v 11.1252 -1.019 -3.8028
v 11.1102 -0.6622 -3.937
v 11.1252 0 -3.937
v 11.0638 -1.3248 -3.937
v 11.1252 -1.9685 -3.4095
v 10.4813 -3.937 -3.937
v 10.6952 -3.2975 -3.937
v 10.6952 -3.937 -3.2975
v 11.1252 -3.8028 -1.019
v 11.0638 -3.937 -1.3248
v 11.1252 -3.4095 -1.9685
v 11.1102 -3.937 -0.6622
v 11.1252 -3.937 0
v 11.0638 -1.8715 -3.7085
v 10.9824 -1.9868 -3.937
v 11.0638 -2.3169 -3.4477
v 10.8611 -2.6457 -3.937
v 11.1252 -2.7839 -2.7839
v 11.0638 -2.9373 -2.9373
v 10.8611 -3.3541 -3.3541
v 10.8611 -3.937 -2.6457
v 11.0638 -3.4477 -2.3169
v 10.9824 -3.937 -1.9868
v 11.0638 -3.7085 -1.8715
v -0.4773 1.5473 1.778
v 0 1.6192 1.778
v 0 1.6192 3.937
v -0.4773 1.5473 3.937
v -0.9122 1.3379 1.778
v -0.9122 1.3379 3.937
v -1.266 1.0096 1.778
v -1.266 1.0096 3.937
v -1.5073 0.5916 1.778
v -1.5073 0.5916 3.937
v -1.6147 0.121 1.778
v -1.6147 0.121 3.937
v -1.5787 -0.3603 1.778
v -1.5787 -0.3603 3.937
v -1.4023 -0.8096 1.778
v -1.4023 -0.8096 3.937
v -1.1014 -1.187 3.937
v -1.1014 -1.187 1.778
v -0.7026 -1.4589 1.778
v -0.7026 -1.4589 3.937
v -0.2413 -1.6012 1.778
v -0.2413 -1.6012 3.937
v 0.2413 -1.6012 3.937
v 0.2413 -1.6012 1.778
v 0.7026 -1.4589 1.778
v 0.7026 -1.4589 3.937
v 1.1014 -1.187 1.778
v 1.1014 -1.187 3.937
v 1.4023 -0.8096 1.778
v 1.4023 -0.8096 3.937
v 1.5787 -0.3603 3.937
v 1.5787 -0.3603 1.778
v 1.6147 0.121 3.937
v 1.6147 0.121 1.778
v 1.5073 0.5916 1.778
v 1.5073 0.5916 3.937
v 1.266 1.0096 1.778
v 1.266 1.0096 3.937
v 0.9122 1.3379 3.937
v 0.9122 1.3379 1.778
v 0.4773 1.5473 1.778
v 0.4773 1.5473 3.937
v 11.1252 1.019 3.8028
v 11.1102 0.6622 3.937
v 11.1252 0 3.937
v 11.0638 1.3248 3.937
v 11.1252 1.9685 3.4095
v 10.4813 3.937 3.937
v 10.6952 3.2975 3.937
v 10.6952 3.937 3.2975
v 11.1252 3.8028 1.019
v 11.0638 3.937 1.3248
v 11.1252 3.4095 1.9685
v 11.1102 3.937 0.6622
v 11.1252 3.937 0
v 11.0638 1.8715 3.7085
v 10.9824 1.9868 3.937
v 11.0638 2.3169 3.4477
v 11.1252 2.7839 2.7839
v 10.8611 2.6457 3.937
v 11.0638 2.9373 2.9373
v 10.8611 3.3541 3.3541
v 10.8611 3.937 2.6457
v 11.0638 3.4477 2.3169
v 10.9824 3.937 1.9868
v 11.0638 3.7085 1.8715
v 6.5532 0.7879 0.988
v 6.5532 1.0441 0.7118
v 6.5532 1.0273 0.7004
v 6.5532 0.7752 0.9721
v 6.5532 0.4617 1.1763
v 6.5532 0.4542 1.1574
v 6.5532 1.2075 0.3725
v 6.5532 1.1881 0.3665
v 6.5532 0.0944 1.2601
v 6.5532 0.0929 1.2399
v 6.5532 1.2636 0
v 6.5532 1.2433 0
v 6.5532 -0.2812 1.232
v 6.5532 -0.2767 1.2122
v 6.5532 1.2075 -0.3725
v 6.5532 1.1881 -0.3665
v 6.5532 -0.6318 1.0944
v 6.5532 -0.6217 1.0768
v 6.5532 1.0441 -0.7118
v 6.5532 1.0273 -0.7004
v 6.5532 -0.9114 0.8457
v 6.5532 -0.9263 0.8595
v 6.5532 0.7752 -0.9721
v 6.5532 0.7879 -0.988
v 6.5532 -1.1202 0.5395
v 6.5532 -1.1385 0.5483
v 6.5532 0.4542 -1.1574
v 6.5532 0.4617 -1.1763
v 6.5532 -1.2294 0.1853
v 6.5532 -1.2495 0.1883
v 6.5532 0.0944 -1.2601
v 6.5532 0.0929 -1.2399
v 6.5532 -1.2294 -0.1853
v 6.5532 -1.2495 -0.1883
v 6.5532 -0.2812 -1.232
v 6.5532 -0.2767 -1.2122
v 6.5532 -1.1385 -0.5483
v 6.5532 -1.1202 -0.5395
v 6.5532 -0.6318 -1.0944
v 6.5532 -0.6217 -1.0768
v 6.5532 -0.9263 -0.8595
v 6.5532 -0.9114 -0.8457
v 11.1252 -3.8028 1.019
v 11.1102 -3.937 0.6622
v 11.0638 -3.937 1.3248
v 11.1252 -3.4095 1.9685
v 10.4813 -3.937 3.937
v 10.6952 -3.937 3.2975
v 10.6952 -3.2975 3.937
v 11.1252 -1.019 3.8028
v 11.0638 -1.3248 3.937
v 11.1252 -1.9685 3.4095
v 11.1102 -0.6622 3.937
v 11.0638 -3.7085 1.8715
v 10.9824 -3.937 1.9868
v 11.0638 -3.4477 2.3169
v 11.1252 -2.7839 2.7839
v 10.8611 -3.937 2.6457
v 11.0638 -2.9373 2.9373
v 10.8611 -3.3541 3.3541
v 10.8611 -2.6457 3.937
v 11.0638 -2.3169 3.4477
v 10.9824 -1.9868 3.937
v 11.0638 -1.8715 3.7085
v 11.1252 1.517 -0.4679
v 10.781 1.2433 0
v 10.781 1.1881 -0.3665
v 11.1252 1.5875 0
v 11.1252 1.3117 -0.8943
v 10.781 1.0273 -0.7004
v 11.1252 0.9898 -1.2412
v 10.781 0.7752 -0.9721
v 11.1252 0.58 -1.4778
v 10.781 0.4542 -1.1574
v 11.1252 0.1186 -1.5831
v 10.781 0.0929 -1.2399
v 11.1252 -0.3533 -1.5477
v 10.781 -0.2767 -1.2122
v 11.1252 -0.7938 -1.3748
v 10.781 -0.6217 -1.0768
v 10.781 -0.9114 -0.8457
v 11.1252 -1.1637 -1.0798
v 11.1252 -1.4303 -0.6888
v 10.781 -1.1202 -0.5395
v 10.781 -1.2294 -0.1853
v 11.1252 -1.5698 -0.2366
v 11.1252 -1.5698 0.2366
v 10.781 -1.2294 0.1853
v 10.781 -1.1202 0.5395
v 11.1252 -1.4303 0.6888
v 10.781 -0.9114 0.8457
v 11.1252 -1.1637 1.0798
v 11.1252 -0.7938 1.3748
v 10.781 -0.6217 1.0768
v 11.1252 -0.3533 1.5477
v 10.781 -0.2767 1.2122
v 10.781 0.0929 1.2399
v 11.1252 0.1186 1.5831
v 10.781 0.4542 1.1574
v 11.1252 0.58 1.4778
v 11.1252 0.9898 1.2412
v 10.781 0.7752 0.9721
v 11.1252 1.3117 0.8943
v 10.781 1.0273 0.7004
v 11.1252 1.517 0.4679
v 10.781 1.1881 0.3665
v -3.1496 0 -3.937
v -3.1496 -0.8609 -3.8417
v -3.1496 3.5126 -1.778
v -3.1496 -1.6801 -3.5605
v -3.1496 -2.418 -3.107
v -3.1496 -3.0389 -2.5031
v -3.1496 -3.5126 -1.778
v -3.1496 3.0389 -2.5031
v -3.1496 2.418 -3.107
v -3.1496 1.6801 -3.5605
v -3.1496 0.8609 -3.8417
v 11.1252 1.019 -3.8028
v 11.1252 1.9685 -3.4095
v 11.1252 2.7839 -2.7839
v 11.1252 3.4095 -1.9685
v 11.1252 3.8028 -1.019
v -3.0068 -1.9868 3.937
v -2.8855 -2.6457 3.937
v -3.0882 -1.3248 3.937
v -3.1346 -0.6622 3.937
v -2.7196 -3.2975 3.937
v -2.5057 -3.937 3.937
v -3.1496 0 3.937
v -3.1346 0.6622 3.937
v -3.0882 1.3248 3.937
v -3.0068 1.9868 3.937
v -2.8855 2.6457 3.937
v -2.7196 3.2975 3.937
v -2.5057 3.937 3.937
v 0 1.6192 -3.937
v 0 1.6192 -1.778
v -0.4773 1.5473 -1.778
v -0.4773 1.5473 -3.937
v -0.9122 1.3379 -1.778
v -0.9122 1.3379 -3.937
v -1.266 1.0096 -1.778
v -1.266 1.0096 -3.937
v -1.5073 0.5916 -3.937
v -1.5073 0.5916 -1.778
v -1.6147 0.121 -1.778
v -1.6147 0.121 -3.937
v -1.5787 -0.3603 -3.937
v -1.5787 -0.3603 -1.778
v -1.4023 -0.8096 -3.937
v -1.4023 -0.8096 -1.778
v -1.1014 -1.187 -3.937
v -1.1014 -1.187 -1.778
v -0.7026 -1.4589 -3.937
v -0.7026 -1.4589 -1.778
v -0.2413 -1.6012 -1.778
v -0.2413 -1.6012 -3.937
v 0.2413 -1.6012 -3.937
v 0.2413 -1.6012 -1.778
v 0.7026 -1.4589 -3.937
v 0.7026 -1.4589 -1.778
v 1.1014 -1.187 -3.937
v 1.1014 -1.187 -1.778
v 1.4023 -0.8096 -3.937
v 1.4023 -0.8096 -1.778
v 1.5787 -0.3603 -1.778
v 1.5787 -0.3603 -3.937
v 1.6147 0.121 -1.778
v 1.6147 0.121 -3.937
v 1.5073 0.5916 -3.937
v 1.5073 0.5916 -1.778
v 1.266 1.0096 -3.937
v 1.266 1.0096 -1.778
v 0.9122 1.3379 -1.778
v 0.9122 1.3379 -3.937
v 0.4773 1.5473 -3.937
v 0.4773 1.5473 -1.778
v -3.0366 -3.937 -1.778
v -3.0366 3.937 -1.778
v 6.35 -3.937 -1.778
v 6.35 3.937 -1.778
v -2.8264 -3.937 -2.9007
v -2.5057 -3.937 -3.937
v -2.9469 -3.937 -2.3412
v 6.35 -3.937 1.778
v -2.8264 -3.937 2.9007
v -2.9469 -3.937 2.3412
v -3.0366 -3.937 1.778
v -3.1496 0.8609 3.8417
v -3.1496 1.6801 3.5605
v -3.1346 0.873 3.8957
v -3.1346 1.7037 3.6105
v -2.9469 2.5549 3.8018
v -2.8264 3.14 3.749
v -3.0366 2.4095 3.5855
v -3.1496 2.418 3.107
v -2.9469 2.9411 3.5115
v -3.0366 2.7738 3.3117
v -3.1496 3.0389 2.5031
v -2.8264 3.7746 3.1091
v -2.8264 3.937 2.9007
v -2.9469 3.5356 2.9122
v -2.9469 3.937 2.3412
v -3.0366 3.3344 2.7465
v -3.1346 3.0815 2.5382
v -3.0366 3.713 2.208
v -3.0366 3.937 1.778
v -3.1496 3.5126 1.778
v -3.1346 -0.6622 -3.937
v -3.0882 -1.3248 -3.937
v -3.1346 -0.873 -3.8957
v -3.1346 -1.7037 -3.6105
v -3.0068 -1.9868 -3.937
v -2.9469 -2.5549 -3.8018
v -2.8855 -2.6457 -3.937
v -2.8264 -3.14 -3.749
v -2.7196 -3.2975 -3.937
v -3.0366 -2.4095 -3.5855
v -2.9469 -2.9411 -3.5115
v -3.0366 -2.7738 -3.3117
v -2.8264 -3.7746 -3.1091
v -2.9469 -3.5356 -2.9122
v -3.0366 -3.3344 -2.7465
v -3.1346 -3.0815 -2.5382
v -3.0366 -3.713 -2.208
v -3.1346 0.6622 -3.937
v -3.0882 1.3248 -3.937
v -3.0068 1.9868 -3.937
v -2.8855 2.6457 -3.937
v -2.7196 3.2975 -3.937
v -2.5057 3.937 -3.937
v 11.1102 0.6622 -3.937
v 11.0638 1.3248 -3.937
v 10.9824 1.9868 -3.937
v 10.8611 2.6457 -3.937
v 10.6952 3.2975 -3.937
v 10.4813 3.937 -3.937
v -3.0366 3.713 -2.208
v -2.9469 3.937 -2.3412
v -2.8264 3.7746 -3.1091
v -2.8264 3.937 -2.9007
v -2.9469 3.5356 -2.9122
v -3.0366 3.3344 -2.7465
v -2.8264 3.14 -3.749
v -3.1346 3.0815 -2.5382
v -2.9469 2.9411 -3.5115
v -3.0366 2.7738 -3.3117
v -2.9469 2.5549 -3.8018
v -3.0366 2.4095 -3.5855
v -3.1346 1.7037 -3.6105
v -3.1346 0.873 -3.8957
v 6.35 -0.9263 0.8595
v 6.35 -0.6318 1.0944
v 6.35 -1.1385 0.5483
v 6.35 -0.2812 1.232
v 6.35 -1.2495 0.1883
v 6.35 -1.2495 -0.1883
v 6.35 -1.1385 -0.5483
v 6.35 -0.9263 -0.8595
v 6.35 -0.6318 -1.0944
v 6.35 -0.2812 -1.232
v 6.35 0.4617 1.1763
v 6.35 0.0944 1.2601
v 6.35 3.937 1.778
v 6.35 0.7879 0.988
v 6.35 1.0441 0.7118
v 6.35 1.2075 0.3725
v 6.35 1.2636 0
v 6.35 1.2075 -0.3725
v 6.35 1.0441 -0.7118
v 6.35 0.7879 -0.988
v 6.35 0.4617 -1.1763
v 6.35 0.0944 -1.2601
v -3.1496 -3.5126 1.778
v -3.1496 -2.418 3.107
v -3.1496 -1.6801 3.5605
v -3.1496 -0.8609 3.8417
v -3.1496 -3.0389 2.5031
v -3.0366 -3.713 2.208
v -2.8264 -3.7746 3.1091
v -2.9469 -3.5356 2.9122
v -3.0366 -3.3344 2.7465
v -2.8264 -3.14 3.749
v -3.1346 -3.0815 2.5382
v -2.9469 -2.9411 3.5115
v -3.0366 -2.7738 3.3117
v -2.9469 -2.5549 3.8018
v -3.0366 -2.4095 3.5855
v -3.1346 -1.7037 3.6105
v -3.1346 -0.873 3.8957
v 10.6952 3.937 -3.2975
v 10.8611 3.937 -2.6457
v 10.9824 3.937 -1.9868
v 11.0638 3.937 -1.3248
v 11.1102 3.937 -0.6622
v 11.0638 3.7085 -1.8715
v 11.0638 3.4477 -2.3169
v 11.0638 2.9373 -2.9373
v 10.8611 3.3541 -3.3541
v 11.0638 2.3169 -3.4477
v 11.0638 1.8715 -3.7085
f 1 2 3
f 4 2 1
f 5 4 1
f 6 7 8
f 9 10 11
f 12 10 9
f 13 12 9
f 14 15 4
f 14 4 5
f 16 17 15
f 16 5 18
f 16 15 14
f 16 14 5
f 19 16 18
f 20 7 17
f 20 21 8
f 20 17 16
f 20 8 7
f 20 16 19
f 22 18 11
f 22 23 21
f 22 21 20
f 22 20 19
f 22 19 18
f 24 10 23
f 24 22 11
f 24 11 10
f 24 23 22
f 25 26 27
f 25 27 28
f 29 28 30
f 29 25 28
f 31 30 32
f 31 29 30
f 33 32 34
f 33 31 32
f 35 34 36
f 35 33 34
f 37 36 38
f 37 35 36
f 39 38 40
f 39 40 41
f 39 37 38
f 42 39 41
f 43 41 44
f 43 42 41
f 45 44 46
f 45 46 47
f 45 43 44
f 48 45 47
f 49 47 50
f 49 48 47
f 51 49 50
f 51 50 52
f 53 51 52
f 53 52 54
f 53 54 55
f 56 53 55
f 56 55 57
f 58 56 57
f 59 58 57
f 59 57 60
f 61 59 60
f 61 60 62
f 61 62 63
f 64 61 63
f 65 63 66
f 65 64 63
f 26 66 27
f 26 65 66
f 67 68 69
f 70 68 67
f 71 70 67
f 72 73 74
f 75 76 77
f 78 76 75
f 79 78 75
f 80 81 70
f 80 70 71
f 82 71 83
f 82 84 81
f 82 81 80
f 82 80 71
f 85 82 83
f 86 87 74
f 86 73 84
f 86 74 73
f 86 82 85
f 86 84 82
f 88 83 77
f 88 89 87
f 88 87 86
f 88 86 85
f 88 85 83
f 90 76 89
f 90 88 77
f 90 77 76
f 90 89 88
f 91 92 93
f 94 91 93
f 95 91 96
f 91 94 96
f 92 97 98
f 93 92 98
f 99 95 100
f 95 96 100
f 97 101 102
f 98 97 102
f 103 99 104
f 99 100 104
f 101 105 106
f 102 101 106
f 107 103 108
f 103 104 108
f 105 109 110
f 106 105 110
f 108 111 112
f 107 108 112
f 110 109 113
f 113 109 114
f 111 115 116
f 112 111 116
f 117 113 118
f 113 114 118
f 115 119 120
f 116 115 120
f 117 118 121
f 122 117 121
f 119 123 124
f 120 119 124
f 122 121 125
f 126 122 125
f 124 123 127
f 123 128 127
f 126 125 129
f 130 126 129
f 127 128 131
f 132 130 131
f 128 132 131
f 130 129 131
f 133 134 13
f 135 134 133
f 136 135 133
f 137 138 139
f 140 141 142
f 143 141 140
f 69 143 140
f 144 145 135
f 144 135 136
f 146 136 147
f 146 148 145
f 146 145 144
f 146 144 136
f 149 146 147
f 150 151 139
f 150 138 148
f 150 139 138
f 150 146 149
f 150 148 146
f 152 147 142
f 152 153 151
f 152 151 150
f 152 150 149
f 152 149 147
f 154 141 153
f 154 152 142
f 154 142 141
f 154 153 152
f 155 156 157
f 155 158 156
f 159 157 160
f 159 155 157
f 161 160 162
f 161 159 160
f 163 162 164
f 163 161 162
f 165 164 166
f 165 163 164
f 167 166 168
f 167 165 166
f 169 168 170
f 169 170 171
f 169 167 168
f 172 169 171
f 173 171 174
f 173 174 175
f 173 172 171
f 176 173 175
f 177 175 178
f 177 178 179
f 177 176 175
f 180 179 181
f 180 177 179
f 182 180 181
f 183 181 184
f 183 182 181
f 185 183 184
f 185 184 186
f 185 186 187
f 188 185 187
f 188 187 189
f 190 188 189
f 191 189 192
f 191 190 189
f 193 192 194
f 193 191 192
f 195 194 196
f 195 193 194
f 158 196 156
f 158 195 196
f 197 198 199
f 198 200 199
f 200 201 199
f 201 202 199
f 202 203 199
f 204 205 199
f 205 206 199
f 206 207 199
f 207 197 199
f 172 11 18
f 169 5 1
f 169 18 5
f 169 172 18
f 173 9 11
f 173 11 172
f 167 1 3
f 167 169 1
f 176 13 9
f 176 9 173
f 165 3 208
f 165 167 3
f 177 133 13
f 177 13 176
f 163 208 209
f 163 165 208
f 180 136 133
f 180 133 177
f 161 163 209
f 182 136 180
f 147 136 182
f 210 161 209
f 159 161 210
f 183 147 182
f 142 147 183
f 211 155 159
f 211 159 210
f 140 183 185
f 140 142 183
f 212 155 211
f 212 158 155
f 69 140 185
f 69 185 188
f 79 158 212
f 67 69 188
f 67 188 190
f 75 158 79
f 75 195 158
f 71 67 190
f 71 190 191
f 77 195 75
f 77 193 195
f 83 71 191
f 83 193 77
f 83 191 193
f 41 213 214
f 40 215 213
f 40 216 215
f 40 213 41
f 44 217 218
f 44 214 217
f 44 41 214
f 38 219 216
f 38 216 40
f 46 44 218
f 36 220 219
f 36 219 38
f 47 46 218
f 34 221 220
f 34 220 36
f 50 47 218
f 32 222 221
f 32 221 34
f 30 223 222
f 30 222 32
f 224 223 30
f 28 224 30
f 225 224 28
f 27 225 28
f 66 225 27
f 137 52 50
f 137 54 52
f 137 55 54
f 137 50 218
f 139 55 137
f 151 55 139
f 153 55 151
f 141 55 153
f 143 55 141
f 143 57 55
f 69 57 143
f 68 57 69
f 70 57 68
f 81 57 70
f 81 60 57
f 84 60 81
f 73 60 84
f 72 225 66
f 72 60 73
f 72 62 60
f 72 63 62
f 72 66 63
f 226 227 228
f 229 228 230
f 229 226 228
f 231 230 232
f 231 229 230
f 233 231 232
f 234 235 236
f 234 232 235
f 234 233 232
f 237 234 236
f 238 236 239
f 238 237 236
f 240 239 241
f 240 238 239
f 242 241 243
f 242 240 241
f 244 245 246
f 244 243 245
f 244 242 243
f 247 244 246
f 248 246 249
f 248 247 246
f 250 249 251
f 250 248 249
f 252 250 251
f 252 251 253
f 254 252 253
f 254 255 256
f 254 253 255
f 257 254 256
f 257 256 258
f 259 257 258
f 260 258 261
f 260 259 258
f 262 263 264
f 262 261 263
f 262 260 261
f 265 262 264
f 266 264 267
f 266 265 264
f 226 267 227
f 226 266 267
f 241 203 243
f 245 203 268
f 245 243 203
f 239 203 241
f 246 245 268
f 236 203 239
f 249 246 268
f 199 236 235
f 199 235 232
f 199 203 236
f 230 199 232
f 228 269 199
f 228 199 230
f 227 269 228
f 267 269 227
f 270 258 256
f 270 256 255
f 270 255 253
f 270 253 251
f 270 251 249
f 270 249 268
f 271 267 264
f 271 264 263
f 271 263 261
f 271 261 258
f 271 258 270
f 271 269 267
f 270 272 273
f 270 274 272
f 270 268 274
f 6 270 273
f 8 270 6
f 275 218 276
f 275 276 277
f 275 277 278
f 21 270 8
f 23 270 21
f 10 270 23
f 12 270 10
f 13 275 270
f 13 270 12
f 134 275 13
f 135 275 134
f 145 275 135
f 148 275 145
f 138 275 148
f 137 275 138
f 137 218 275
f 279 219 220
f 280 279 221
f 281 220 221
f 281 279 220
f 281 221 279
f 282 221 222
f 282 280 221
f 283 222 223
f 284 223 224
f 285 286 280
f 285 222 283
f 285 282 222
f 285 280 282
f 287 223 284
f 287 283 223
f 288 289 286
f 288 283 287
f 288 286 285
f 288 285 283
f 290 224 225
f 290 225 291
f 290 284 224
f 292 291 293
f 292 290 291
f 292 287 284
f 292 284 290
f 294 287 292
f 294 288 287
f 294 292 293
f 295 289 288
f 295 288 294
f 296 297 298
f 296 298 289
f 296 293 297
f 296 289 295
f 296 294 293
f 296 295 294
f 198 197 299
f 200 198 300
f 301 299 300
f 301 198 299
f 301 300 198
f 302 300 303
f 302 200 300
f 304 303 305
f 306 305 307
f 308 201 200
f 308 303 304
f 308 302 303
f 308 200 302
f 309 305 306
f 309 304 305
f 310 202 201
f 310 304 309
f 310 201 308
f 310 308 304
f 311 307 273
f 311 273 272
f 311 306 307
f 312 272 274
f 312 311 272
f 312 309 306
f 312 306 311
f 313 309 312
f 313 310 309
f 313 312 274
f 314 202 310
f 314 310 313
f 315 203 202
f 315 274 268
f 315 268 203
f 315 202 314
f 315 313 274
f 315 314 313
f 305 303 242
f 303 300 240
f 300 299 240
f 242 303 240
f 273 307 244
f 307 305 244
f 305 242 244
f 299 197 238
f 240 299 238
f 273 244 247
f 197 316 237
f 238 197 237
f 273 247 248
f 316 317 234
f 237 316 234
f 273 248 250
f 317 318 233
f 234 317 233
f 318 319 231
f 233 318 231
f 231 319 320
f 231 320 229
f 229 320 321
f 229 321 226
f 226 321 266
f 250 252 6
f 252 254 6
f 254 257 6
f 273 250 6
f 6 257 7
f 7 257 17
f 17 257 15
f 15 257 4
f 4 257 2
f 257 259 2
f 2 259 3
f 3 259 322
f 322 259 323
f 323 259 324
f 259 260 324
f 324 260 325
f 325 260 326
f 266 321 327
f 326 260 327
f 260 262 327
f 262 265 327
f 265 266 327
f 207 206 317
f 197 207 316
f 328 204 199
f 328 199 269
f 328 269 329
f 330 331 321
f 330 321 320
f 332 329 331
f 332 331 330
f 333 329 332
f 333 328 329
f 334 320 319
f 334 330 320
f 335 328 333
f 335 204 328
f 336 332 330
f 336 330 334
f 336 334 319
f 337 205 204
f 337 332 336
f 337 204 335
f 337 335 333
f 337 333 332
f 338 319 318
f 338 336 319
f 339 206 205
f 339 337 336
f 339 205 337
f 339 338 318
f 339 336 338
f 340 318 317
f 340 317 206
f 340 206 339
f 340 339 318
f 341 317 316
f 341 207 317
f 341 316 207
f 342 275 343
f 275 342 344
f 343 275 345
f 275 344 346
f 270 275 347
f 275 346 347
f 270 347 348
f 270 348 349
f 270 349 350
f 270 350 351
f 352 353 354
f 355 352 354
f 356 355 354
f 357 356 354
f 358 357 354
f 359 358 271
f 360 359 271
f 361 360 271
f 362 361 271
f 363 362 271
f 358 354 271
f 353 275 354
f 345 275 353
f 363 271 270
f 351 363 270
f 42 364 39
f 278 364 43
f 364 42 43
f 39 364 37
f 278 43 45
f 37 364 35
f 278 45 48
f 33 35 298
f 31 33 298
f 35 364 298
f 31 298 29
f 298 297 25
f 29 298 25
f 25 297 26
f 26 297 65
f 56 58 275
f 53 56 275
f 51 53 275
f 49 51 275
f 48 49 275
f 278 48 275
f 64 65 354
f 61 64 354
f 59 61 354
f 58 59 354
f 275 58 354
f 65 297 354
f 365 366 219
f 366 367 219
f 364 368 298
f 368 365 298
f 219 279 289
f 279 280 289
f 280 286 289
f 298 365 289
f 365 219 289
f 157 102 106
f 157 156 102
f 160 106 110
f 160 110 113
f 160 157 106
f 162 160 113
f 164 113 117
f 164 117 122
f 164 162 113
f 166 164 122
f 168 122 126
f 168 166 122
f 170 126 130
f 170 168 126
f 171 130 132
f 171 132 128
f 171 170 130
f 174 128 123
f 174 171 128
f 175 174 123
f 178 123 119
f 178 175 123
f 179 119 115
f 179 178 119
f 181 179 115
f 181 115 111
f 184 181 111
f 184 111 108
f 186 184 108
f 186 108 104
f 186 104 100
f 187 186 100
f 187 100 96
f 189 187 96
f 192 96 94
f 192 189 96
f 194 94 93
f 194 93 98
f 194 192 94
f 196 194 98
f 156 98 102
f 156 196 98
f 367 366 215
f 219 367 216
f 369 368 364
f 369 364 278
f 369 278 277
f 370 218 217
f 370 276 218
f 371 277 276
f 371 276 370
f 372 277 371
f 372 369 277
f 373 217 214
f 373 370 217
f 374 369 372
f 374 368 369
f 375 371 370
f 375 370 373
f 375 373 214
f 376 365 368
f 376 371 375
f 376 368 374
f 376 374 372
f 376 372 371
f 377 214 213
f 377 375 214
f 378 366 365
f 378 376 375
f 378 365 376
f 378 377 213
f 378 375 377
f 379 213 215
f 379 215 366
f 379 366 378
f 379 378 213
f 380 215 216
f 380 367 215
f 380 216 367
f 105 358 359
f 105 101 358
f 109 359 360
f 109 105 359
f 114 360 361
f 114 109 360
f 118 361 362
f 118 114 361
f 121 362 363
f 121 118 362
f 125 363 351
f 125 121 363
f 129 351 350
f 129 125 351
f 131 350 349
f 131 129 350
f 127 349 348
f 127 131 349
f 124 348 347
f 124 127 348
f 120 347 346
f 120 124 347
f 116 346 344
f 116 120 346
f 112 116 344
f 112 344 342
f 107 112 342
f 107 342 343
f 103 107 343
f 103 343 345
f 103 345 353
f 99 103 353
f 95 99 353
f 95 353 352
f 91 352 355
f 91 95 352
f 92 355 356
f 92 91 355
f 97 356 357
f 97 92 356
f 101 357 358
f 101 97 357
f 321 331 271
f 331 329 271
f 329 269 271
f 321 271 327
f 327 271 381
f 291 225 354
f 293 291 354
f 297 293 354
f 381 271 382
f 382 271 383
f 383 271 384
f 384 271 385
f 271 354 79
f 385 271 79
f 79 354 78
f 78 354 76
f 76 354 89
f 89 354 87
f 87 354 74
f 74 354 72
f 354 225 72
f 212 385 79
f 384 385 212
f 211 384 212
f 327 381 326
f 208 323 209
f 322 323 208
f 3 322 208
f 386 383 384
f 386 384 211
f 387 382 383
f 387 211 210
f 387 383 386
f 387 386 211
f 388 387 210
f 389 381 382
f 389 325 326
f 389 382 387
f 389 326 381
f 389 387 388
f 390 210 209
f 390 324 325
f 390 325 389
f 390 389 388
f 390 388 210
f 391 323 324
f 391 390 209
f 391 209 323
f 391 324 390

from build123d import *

# Parameters (mm, degrees)
BOSS_EXTRUDE1_DEPTH      = 3.937
BOSS_EXTRUDE1_DEPTH_BACK = 3.937
SKETCH1_W                = 14.2748
SKETCH1_H                = 7.874
CUT_EXTRUDE1_DEPTH       = 3.937
CUT_EXTRUDE1_DEPTH_BACK  = 3.937
SKETCH2_W                = 9.4996
SKETCH2_H                = 3.556
SKETCH4_W                = 0.2032
SKETCH4_H                = 1.26365
SKETCH5_W                = 7.874
SKETCH5_H                = 1.61925


with BuildPart() as part:
    # Sketch1 → Boss-Extrude1 (new, two sides: drawn at the far end of the back side and taken through both)
    with BuildSketch(Plane.XY.offset(-BOSS_EXTRUDE1_DEPTH_BACK)):
        with Locations((3.9878, 0)):
            Rectangle(SKETCH1_W, SKETCH1_H)
    extrude(amount=BOSS_EXTRUDE1_DEPTH + BOSS_EXTRUDE1_DEPTH_BACK)

    # Sketch2 → Cut-Extrude1 (cut, two sides: drawn at the far end of the back side and taken through both)
    with BuildSketch(Plane(origin=(0, 0, 0), x_dir=(1, 0, 0), z_dir=(0, 1, 0)).offset(-CUT_EXTRUDE1_DEPTH_BACK)):
        with Locations((1.6002, 0)):
            Rectangle(SKETCH2_W, SKETCH2_H)
    extrude(amount=CUT_EXTRUDE1_DEPTH + CUT_EXTRUDE1_DEPTH_BACK, mode=Mode.SUBTRACT)

    # Sketch3 → Cut-Revolve1 (revolve, cut)
    with BuildSketch(Plane.XY):
        Polygon((6.5532, 0), (6.5532, 1.24333), (10.78103, 1.24333), (11.1252, 1.5875), (11.1252, 0), align=None)
    revolve(axis=Axis((11.1252, 0, 0), (-1, 0, 0)), mode=Mode.SUBTRACT)

    # Sketch4 → Cut-Revolve2 (revolve, cut)
    with BuildSketch(Plane.XY):
        with Locations((6.4516, 0.631825)):
            Rectangle(SKETCH4_W, SKETCH4_H)
    revolve(axis=Axis((6.5532, 0, 0), (-1, 0, 0)), mode=Mode.SUBTRACT)

    # Sketch5 → Cut-Revolve3 (revolve, cut)
    with BuildSketch(Plane(origin=(0, 0, 0), x_dir=(0, 0, -1), z_dir=(1, 0, 0))):
        with Locations((0, 0.809625)):
            Rectangle(SKETCH5_W, SKETCH5_H)
    revolve(axis=Axis((0, 0, -3.937), (0, 0, 1)), mode=Mode.SUBTRACT)

    # Sketch6 → Cut-Revolve4 (revolve, cut)
    with BuildSketch(Plane.XY):
        with BuildLine():
            Line((11.1252, 0), (11.1252, 3.937))
            ThreePointArc((11.1252, 3.937), (10.164844056, 6.105270359), (8.5852, 7.874))
            Line((8.5852, 7.874), (15.0622, 7.874))
            Line((15.0622, 7.874), (15.0622, 0))
            Line((15.0622, 0), (11.1252, 0))
        make_face()
    revolve(axis=Axis((15.0622, 0, 0), (-1, 0, 0)), mode=Mode.SUBTRACT)

    # Sketch7 → Cut-Revolve5 (revolve, cut)
    with BuildSketch(Plane.XY):
        with BuildLine():
            Line((-7.0866, 0), (-7.0866, 7.874))
            Line((-7.0866, 7.874), (-0.6096, 7.874))
            ThreePointArc((-0.6096, 7.874), (-2.189244056, 6.105270359), (-3.1496, 3.937))
            Line((-3.1496, 3.937), (-3.1496, 0))
            Line((-3.1496, 0), (-7.0866, 0))
        make_face()
    revolve(axis=Axis((-3.1496, 0, 0), (-1, 0, 0)), mode=Mode.SUBTRACT)


solid = part.part
